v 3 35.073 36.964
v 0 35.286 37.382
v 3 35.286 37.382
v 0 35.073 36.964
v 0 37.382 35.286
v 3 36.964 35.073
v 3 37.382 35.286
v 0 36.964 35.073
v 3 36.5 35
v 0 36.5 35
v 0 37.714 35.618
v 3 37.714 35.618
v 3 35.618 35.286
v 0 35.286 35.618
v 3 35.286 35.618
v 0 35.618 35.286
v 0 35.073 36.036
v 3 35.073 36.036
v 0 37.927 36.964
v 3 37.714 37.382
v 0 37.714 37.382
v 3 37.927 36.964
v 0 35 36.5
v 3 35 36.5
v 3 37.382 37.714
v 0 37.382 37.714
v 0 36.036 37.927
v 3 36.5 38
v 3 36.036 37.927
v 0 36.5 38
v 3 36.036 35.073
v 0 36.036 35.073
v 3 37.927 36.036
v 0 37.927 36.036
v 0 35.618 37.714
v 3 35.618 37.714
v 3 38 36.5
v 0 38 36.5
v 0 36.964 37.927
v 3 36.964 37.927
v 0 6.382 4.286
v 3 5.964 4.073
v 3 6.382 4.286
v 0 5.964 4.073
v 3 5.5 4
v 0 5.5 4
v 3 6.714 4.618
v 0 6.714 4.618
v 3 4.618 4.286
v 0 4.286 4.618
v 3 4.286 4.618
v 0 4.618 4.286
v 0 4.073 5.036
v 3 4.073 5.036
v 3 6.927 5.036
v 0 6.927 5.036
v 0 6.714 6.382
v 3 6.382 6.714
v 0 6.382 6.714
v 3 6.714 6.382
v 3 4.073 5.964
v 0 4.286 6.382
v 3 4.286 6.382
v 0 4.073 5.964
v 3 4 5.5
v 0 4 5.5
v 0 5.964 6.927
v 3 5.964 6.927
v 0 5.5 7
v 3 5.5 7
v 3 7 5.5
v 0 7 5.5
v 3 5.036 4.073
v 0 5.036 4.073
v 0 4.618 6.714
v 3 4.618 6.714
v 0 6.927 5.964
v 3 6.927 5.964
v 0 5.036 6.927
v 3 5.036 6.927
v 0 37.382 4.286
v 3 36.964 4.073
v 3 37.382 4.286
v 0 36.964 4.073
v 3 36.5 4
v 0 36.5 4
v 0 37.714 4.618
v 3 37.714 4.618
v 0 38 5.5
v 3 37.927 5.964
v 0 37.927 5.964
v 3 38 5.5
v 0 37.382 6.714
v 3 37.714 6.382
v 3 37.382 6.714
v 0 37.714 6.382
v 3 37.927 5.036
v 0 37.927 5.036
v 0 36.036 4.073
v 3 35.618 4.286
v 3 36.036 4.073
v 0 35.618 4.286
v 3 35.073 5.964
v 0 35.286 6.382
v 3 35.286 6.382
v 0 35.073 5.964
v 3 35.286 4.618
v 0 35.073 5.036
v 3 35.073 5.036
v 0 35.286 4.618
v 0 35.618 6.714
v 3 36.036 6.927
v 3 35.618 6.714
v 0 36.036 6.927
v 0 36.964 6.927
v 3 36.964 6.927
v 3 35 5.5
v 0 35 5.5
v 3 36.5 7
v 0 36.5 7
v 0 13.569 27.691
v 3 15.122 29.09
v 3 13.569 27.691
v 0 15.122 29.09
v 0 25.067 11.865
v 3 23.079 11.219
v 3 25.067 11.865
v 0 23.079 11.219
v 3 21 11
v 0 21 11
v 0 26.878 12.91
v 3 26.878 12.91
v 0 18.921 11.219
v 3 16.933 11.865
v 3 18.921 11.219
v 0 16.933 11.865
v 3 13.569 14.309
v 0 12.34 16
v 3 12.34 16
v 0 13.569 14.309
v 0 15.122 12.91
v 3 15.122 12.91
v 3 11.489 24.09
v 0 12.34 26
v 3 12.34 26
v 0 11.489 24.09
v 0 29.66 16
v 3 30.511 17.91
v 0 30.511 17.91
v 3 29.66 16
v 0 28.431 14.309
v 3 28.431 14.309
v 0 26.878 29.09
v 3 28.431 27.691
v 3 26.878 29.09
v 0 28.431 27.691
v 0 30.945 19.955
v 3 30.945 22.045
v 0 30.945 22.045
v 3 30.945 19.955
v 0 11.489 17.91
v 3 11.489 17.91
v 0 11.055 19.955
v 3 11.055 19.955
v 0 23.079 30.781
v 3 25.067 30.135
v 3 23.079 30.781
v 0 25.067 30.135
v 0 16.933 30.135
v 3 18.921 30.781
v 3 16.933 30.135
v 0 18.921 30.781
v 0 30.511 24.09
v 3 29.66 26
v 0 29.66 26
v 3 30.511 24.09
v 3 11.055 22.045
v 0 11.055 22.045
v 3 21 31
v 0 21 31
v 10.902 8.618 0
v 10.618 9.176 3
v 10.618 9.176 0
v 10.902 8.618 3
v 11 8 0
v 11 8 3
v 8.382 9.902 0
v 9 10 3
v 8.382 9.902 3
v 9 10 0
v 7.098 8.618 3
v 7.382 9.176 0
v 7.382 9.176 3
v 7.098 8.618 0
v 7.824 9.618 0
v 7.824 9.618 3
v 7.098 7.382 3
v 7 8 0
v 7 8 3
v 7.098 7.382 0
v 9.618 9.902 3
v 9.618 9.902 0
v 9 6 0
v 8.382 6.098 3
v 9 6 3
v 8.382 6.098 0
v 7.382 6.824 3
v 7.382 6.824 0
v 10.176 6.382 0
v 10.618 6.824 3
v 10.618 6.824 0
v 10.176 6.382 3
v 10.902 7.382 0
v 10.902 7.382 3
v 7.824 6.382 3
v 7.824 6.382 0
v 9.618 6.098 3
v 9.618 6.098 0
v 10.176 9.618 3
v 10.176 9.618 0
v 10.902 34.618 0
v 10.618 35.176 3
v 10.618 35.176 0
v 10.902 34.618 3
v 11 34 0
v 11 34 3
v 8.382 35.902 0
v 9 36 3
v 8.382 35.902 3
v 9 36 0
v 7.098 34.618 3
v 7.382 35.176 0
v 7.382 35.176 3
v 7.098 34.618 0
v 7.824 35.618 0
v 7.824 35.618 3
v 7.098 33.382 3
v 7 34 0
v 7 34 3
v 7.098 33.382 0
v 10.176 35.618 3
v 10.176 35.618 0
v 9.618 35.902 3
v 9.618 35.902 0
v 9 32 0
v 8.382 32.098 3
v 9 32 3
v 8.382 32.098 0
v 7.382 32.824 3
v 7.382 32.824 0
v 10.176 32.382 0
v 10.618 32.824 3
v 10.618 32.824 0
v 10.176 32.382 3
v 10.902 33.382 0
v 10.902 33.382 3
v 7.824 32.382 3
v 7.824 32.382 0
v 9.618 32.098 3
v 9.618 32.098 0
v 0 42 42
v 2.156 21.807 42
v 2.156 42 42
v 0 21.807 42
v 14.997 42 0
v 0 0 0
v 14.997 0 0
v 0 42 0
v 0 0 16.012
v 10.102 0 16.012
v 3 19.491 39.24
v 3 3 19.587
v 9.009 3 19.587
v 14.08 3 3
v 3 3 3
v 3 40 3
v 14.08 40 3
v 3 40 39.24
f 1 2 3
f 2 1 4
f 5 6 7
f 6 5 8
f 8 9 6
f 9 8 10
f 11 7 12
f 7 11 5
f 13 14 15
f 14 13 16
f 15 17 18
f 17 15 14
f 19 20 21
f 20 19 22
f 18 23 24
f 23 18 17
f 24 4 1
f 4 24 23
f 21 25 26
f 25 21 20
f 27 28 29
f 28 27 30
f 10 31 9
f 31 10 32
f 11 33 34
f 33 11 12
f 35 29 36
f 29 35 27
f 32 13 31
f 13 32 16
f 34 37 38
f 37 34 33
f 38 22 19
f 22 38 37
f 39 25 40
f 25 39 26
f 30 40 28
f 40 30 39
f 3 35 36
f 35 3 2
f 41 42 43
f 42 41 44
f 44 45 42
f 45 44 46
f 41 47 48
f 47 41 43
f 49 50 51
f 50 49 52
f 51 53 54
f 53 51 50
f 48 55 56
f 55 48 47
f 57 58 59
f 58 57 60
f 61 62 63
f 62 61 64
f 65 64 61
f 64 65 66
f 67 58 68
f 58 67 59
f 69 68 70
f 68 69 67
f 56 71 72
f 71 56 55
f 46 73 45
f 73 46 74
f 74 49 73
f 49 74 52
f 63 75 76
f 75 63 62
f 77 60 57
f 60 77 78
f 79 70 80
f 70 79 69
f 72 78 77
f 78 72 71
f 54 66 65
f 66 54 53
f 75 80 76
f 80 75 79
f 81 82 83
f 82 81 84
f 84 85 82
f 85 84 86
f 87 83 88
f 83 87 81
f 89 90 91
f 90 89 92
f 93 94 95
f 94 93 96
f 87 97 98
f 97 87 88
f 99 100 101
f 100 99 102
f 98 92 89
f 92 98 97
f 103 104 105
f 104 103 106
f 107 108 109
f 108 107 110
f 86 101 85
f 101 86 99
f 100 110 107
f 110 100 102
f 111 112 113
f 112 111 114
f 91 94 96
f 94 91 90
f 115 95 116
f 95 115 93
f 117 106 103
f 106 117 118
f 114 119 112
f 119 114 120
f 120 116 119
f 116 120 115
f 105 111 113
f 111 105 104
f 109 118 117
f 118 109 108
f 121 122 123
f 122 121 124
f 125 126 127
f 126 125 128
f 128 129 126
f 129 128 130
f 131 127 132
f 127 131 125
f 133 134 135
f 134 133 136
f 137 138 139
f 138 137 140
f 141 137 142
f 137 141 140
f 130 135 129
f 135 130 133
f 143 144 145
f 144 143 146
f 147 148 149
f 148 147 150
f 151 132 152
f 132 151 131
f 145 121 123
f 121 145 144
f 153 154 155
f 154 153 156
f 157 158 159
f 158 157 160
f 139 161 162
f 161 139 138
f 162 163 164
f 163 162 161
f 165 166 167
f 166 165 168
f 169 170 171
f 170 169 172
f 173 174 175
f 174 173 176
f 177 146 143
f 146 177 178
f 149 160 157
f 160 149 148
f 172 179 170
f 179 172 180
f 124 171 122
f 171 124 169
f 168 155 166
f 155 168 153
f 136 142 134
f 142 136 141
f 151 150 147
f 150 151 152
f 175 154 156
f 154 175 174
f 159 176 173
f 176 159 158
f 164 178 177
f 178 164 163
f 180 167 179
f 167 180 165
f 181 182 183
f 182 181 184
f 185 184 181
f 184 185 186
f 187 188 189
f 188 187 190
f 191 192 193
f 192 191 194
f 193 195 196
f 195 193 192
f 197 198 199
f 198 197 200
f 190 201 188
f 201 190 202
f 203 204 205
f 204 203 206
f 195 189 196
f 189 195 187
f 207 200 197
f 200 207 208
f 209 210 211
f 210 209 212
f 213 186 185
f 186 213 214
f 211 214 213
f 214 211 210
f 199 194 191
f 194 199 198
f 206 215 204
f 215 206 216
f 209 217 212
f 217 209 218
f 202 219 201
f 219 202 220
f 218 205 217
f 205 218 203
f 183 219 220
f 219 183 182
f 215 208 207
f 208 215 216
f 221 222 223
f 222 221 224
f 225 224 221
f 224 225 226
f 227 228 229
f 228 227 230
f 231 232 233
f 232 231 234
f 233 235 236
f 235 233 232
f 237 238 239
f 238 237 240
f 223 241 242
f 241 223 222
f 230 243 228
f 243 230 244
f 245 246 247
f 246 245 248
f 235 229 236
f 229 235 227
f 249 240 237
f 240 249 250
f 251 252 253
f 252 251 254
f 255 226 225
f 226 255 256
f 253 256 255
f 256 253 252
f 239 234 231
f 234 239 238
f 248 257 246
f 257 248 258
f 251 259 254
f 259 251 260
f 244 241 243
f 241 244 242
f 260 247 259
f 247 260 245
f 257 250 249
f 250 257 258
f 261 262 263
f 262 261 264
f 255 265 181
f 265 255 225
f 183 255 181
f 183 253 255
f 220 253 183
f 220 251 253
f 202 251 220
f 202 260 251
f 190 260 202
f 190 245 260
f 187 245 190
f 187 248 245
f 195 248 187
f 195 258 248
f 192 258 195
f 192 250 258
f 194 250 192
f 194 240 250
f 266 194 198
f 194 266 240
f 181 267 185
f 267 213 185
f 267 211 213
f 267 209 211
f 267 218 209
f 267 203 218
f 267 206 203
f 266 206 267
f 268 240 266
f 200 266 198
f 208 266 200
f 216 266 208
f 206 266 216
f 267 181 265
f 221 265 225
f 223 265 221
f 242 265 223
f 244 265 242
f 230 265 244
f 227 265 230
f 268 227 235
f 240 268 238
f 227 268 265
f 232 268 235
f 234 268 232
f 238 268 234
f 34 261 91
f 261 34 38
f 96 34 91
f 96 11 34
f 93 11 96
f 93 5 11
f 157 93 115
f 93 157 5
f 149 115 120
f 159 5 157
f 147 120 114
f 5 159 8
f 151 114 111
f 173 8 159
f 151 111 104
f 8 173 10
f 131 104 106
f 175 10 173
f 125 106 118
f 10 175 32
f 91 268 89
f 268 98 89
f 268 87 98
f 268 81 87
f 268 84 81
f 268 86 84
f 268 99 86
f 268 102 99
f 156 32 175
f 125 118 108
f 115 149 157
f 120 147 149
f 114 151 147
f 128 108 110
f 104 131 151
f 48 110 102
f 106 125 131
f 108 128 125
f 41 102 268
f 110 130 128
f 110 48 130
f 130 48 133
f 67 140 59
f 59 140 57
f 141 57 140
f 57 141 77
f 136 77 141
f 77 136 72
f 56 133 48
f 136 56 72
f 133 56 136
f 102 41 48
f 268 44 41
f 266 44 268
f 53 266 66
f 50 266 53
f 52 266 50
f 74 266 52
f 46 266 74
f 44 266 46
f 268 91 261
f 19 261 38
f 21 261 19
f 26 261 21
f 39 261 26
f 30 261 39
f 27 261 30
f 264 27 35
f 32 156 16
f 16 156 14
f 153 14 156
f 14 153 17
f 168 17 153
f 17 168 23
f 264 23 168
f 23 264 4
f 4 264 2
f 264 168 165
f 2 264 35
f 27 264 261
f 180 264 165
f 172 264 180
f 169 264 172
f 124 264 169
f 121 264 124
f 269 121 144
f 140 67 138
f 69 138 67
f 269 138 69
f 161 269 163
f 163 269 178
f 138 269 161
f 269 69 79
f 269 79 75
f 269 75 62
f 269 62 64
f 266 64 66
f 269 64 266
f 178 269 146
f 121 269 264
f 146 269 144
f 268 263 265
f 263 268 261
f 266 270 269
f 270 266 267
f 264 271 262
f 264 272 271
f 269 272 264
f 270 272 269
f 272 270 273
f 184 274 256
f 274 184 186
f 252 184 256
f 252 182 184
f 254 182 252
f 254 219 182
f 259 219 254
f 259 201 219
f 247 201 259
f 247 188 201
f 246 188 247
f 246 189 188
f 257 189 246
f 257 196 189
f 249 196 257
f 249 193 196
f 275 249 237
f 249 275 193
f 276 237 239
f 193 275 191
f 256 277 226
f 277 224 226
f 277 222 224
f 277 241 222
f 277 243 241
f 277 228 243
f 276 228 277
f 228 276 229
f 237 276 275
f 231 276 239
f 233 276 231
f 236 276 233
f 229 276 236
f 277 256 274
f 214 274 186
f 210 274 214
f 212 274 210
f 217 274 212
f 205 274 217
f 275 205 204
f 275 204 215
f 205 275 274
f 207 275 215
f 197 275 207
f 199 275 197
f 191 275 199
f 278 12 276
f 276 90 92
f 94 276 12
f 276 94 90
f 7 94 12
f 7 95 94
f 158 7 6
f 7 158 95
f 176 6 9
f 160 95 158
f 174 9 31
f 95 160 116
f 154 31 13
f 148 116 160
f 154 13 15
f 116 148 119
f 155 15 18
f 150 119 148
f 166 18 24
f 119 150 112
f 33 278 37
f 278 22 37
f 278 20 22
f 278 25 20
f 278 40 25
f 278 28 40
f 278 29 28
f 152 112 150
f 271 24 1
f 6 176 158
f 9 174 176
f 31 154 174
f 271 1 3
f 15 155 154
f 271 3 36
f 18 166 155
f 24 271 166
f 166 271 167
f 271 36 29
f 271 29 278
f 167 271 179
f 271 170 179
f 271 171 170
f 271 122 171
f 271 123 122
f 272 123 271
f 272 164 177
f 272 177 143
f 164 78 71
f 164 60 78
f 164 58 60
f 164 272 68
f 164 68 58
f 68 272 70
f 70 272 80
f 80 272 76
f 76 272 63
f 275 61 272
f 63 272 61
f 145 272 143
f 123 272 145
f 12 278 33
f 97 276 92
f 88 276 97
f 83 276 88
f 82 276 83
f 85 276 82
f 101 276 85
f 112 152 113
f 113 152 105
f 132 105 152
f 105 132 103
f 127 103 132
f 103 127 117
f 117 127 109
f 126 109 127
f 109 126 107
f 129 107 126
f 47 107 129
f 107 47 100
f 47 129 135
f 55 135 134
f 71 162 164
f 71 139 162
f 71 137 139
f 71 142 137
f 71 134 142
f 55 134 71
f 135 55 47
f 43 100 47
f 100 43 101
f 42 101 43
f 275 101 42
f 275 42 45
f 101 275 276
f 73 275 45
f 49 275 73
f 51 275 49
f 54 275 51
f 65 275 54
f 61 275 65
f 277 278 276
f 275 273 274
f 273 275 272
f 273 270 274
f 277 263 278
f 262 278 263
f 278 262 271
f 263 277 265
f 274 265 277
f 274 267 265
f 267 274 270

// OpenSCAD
%translate([-42,0]) {
  cube(42);
  translate([42,21,21]) rotate([0,90,0]) {
    stepper_cutout(1);
  }
}
translate([5,0]) {
  rotate([0,-90,0]) !difference() {
    cube([15,42,42]);
    translate([-.01,-.01,16]) rotate([50,0]) cube(40);
    translate([3,3,3]) cube([43,37,43]);
    translate([-.01,21,21]) rotate([0,90]) {
      stepper_cutout();
    }
    *translate([21,21,-.01]) stepper_cutout();
    *translate([21,-.01,21]) rotate([-90,0]) stepper_cutout();
    for(y=[8,34])
      translate([9,y,-.01]) cylinder(d=4,h=5,$fn=20);
    translate([15,-.01,-.01]) rotate([0,-17,0]) cube(50);
  }
}

module stepper_cutout(inverse=0)
{
  if(inverse)
    cylinder(d=5,h=20,$fn=30);
  else
    cylinder(d=20,h=4,$fn=30);
  for(x=[-15.5,15.5],y=[-15.5,15.5])
    translate([x,y]) cylinder(d=3,h=5,$fn=20);
}
